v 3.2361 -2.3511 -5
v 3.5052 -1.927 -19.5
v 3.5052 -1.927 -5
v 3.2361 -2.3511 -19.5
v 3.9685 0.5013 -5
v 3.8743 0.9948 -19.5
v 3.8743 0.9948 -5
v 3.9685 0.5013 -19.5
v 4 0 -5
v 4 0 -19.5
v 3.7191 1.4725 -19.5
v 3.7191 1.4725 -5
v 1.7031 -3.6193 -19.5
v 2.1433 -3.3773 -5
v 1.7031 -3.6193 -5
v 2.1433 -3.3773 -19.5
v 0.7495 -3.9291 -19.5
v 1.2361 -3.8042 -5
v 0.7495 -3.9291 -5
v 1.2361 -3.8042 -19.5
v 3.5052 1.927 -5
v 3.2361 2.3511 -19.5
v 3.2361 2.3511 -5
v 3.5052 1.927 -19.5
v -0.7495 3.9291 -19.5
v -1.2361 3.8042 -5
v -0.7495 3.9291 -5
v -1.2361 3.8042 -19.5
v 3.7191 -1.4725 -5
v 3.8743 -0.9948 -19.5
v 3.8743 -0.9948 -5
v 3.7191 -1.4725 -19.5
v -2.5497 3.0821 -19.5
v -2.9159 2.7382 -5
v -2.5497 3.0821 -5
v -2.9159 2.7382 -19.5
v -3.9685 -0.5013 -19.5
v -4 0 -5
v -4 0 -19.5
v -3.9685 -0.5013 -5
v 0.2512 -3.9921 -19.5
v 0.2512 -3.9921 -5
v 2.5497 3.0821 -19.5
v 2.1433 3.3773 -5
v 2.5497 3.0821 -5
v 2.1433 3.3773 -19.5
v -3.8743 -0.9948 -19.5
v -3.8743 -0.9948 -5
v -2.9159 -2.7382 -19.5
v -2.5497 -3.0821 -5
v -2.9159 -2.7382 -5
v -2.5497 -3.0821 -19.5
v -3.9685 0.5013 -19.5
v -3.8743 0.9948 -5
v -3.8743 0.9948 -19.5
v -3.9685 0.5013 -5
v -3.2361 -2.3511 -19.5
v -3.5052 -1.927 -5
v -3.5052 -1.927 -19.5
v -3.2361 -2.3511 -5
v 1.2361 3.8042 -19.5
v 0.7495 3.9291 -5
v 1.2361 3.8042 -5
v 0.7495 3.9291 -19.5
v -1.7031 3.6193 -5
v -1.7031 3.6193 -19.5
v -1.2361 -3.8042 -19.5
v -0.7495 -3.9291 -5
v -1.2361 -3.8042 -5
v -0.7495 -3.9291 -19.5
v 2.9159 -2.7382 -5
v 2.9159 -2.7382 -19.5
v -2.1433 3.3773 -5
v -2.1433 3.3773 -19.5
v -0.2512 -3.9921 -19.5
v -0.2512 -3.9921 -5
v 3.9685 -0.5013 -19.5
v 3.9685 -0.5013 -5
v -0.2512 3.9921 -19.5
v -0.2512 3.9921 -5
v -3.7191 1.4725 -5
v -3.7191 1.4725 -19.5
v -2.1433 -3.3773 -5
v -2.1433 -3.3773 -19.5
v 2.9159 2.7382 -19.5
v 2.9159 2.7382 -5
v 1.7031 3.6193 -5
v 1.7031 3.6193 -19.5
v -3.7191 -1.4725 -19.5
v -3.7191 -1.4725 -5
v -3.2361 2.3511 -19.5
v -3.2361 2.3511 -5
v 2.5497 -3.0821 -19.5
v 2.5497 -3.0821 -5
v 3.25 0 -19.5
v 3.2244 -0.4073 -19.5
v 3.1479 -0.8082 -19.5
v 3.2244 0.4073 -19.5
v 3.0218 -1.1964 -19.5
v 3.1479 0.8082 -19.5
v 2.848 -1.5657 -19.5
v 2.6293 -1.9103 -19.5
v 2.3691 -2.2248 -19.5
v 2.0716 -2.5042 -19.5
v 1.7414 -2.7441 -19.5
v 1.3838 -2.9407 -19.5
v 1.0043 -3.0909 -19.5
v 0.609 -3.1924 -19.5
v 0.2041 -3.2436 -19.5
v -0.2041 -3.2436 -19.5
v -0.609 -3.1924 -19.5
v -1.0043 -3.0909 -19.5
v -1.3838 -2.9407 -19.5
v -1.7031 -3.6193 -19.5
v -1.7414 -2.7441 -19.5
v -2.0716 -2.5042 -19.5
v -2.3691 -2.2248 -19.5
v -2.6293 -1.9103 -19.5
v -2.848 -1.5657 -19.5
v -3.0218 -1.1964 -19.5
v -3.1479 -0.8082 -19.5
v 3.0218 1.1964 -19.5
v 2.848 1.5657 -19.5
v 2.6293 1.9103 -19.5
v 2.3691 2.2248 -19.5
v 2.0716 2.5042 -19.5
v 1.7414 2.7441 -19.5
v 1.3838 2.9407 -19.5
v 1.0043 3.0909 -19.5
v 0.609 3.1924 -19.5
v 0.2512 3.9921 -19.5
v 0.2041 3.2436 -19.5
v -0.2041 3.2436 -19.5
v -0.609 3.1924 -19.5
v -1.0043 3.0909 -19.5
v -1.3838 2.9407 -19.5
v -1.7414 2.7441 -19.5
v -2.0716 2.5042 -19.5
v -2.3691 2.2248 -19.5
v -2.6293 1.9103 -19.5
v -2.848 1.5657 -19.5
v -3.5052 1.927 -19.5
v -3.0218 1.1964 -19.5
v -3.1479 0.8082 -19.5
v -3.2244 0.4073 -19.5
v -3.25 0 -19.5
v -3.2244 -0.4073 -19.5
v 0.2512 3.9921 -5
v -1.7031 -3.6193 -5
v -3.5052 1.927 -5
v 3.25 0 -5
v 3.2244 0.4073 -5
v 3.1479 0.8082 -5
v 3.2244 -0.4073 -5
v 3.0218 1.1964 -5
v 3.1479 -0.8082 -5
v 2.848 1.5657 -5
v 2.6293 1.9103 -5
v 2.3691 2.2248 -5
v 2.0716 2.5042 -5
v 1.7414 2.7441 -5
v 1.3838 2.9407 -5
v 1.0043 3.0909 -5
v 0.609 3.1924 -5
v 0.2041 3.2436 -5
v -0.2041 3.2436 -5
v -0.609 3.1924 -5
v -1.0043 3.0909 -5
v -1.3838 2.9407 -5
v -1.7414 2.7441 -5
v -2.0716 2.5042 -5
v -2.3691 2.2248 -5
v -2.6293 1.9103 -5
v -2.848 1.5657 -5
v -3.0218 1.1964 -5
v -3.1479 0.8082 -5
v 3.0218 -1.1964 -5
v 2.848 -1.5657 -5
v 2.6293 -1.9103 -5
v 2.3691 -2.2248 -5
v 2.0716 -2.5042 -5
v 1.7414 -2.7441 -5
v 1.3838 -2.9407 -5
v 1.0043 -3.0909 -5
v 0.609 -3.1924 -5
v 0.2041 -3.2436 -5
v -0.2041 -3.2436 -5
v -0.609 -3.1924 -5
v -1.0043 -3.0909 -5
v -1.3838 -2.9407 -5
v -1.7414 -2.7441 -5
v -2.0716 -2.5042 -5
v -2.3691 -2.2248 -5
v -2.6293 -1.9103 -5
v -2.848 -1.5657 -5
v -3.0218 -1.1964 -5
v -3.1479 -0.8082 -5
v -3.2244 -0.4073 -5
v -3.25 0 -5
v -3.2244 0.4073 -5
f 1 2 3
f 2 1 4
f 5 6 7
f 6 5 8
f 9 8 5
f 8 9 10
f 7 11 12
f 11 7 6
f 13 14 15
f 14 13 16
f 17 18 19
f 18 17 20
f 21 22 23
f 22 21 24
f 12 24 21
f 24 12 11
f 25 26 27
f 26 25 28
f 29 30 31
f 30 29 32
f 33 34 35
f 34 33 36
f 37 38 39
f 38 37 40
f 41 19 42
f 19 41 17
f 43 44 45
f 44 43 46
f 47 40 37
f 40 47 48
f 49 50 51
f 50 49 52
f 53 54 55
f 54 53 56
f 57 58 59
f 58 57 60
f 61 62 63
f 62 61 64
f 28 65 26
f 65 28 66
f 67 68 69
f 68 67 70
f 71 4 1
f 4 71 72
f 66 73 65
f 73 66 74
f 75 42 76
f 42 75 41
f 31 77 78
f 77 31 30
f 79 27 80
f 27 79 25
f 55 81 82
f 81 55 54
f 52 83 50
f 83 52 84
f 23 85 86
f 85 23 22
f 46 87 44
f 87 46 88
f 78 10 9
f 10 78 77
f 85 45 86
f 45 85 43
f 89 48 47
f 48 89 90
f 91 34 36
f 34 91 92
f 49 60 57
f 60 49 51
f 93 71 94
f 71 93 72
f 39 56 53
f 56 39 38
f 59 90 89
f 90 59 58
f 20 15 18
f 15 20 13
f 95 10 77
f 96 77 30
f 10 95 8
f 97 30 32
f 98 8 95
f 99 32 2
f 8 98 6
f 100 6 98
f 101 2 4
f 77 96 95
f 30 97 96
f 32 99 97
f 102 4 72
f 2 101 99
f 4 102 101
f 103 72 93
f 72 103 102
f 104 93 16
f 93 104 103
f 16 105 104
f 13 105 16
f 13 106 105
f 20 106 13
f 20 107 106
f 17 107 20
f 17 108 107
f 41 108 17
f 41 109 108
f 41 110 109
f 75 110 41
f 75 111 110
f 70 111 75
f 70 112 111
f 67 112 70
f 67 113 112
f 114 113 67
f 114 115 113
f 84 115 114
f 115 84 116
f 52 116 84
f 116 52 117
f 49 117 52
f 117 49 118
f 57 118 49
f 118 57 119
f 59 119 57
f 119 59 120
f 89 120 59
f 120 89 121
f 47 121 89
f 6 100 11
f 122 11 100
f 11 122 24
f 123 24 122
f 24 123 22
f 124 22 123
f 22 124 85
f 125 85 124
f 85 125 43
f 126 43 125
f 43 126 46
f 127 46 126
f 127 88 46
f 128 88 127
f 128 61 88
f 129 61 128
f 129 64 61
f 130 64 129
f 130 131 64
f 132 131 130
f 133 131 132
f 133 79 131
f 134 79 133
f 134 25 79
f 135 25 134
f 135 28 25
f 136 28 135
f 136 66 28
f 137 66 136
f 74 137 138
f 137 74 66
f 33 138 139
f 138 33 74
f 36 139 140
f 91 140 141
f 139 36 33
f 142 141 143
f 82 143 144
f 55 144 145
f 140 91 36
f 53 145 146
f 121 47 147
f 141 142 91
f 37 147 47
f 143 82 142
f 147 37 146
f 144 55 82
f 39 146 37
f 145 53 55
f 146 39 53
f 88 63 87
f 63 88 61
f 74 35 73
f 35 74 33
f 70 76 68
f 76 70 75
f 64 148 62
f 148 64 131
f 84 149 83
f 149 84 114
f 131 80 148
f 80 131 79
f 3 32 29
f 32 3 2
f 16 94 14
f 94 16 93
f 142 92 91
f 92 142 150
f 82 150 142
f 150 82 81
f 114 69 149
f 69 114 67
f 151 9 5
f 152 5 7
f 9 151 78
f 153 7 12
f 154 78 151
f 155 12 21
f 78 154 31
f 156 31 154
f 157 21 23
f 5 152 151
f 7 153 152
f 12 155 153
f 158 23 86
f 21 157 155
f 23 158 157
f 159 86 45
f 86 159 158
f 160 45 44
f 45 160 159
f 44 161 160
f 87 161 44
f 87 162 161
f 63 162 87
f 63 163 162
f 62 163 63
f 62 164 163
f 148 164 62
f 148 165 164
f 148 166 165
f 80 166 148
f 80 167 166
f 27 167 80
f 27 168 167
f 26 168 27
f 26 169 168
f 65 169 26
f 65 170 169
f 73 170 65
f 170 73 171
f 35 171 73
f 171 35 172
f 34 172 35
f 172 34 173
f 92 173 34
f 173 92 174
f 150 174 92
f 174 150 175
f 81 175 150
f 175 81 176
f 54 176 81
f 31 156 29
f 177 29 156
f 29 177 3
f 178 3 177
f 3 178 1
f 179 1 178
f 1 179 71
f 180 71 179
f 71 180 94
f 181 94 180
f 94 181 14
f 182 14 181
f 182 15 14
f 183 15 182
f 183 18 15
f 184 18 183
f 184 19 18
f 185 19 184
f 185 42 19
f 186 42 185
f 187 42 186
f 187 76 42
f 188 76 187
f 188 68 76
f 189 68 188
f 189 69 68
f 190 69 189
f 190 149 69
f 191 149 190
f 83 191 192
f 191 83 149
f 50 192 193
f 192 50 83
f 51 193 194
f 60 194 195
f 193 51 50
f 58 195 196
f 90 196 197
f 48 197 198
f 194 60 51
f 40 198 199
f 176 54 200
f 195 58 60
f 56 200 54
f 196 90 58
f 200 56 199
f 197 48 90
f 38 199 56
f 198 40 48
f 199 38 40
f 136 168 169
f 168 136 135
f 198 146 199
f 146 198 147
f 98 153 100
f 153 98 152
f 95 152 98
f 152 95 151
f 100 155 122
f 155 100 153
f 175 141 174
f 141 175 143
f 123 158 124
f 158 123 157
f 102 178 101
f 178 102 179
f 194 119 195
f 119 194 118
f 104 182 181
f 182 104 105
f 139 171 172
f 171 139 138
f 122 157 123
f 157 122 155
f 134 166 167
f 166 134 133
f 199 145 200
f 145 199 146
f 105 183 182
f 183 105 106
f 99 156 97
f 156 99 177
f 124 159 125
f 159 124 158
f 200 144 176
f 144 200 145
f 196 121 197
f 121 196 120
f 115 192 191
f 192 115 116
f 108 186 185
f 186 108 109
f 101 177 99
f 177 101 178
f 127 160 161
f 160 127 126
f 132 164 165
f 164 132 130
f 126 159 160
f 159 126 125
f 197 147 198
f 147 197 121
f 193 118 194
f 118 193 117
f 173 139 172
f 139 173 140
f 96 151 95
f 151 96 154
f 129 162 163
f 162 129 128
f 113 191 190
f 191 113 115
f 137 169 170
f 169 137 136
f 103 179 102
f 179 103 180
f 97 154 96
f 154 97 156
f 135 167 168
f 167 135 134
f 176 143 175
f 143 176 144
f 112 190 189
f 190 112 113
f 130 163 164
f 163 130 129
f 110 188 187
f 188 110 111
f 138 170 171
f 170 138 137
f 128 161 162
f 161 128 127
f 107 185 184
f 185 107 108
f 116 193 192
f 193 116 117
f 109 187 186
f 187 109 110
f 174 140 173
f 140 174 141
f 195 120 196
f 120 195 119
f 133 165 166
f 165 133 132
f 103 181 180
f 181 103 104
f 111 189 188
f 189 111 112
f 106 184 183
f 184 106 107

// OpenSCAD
$fn = 50;

difference() {
	union() {
		translate(v = [0, 0, -19.5]) {
			cylinder(h = 22.5, r = 4.0);
		}
		#translate(v = [0, 0, -21.0]) {
			cylinder(h = 21, r = 2.875);
		}
	}
	union() {
		translate(v = [0, 0, 0]) {
			rotate(a = [0, 0, 0]) {
				difference() {
					union() {
						translate(v = [0, 0, -5]) {
							linear_extrude(height = 5) {
								polygon(points = [[5.914249999999999, 0.0], [2.957125, 5.1218907443321156], [-2.9571249999999982, 5.1218907443321156], [-5.914249999999999, 7.242867331857232e-16], [-2.9571250000000022, -5.121890744332115], [2.9571249999999956, -5.121890744332118]]);
							}
						}
					}
					union();
				}
			}
		}
		#cylinder(h = 3, r = 6.25);
		#translate(v = [0, 0, -100.0]) {
			cylinder(h = 200, r = 3.25);
		}
	}
}
